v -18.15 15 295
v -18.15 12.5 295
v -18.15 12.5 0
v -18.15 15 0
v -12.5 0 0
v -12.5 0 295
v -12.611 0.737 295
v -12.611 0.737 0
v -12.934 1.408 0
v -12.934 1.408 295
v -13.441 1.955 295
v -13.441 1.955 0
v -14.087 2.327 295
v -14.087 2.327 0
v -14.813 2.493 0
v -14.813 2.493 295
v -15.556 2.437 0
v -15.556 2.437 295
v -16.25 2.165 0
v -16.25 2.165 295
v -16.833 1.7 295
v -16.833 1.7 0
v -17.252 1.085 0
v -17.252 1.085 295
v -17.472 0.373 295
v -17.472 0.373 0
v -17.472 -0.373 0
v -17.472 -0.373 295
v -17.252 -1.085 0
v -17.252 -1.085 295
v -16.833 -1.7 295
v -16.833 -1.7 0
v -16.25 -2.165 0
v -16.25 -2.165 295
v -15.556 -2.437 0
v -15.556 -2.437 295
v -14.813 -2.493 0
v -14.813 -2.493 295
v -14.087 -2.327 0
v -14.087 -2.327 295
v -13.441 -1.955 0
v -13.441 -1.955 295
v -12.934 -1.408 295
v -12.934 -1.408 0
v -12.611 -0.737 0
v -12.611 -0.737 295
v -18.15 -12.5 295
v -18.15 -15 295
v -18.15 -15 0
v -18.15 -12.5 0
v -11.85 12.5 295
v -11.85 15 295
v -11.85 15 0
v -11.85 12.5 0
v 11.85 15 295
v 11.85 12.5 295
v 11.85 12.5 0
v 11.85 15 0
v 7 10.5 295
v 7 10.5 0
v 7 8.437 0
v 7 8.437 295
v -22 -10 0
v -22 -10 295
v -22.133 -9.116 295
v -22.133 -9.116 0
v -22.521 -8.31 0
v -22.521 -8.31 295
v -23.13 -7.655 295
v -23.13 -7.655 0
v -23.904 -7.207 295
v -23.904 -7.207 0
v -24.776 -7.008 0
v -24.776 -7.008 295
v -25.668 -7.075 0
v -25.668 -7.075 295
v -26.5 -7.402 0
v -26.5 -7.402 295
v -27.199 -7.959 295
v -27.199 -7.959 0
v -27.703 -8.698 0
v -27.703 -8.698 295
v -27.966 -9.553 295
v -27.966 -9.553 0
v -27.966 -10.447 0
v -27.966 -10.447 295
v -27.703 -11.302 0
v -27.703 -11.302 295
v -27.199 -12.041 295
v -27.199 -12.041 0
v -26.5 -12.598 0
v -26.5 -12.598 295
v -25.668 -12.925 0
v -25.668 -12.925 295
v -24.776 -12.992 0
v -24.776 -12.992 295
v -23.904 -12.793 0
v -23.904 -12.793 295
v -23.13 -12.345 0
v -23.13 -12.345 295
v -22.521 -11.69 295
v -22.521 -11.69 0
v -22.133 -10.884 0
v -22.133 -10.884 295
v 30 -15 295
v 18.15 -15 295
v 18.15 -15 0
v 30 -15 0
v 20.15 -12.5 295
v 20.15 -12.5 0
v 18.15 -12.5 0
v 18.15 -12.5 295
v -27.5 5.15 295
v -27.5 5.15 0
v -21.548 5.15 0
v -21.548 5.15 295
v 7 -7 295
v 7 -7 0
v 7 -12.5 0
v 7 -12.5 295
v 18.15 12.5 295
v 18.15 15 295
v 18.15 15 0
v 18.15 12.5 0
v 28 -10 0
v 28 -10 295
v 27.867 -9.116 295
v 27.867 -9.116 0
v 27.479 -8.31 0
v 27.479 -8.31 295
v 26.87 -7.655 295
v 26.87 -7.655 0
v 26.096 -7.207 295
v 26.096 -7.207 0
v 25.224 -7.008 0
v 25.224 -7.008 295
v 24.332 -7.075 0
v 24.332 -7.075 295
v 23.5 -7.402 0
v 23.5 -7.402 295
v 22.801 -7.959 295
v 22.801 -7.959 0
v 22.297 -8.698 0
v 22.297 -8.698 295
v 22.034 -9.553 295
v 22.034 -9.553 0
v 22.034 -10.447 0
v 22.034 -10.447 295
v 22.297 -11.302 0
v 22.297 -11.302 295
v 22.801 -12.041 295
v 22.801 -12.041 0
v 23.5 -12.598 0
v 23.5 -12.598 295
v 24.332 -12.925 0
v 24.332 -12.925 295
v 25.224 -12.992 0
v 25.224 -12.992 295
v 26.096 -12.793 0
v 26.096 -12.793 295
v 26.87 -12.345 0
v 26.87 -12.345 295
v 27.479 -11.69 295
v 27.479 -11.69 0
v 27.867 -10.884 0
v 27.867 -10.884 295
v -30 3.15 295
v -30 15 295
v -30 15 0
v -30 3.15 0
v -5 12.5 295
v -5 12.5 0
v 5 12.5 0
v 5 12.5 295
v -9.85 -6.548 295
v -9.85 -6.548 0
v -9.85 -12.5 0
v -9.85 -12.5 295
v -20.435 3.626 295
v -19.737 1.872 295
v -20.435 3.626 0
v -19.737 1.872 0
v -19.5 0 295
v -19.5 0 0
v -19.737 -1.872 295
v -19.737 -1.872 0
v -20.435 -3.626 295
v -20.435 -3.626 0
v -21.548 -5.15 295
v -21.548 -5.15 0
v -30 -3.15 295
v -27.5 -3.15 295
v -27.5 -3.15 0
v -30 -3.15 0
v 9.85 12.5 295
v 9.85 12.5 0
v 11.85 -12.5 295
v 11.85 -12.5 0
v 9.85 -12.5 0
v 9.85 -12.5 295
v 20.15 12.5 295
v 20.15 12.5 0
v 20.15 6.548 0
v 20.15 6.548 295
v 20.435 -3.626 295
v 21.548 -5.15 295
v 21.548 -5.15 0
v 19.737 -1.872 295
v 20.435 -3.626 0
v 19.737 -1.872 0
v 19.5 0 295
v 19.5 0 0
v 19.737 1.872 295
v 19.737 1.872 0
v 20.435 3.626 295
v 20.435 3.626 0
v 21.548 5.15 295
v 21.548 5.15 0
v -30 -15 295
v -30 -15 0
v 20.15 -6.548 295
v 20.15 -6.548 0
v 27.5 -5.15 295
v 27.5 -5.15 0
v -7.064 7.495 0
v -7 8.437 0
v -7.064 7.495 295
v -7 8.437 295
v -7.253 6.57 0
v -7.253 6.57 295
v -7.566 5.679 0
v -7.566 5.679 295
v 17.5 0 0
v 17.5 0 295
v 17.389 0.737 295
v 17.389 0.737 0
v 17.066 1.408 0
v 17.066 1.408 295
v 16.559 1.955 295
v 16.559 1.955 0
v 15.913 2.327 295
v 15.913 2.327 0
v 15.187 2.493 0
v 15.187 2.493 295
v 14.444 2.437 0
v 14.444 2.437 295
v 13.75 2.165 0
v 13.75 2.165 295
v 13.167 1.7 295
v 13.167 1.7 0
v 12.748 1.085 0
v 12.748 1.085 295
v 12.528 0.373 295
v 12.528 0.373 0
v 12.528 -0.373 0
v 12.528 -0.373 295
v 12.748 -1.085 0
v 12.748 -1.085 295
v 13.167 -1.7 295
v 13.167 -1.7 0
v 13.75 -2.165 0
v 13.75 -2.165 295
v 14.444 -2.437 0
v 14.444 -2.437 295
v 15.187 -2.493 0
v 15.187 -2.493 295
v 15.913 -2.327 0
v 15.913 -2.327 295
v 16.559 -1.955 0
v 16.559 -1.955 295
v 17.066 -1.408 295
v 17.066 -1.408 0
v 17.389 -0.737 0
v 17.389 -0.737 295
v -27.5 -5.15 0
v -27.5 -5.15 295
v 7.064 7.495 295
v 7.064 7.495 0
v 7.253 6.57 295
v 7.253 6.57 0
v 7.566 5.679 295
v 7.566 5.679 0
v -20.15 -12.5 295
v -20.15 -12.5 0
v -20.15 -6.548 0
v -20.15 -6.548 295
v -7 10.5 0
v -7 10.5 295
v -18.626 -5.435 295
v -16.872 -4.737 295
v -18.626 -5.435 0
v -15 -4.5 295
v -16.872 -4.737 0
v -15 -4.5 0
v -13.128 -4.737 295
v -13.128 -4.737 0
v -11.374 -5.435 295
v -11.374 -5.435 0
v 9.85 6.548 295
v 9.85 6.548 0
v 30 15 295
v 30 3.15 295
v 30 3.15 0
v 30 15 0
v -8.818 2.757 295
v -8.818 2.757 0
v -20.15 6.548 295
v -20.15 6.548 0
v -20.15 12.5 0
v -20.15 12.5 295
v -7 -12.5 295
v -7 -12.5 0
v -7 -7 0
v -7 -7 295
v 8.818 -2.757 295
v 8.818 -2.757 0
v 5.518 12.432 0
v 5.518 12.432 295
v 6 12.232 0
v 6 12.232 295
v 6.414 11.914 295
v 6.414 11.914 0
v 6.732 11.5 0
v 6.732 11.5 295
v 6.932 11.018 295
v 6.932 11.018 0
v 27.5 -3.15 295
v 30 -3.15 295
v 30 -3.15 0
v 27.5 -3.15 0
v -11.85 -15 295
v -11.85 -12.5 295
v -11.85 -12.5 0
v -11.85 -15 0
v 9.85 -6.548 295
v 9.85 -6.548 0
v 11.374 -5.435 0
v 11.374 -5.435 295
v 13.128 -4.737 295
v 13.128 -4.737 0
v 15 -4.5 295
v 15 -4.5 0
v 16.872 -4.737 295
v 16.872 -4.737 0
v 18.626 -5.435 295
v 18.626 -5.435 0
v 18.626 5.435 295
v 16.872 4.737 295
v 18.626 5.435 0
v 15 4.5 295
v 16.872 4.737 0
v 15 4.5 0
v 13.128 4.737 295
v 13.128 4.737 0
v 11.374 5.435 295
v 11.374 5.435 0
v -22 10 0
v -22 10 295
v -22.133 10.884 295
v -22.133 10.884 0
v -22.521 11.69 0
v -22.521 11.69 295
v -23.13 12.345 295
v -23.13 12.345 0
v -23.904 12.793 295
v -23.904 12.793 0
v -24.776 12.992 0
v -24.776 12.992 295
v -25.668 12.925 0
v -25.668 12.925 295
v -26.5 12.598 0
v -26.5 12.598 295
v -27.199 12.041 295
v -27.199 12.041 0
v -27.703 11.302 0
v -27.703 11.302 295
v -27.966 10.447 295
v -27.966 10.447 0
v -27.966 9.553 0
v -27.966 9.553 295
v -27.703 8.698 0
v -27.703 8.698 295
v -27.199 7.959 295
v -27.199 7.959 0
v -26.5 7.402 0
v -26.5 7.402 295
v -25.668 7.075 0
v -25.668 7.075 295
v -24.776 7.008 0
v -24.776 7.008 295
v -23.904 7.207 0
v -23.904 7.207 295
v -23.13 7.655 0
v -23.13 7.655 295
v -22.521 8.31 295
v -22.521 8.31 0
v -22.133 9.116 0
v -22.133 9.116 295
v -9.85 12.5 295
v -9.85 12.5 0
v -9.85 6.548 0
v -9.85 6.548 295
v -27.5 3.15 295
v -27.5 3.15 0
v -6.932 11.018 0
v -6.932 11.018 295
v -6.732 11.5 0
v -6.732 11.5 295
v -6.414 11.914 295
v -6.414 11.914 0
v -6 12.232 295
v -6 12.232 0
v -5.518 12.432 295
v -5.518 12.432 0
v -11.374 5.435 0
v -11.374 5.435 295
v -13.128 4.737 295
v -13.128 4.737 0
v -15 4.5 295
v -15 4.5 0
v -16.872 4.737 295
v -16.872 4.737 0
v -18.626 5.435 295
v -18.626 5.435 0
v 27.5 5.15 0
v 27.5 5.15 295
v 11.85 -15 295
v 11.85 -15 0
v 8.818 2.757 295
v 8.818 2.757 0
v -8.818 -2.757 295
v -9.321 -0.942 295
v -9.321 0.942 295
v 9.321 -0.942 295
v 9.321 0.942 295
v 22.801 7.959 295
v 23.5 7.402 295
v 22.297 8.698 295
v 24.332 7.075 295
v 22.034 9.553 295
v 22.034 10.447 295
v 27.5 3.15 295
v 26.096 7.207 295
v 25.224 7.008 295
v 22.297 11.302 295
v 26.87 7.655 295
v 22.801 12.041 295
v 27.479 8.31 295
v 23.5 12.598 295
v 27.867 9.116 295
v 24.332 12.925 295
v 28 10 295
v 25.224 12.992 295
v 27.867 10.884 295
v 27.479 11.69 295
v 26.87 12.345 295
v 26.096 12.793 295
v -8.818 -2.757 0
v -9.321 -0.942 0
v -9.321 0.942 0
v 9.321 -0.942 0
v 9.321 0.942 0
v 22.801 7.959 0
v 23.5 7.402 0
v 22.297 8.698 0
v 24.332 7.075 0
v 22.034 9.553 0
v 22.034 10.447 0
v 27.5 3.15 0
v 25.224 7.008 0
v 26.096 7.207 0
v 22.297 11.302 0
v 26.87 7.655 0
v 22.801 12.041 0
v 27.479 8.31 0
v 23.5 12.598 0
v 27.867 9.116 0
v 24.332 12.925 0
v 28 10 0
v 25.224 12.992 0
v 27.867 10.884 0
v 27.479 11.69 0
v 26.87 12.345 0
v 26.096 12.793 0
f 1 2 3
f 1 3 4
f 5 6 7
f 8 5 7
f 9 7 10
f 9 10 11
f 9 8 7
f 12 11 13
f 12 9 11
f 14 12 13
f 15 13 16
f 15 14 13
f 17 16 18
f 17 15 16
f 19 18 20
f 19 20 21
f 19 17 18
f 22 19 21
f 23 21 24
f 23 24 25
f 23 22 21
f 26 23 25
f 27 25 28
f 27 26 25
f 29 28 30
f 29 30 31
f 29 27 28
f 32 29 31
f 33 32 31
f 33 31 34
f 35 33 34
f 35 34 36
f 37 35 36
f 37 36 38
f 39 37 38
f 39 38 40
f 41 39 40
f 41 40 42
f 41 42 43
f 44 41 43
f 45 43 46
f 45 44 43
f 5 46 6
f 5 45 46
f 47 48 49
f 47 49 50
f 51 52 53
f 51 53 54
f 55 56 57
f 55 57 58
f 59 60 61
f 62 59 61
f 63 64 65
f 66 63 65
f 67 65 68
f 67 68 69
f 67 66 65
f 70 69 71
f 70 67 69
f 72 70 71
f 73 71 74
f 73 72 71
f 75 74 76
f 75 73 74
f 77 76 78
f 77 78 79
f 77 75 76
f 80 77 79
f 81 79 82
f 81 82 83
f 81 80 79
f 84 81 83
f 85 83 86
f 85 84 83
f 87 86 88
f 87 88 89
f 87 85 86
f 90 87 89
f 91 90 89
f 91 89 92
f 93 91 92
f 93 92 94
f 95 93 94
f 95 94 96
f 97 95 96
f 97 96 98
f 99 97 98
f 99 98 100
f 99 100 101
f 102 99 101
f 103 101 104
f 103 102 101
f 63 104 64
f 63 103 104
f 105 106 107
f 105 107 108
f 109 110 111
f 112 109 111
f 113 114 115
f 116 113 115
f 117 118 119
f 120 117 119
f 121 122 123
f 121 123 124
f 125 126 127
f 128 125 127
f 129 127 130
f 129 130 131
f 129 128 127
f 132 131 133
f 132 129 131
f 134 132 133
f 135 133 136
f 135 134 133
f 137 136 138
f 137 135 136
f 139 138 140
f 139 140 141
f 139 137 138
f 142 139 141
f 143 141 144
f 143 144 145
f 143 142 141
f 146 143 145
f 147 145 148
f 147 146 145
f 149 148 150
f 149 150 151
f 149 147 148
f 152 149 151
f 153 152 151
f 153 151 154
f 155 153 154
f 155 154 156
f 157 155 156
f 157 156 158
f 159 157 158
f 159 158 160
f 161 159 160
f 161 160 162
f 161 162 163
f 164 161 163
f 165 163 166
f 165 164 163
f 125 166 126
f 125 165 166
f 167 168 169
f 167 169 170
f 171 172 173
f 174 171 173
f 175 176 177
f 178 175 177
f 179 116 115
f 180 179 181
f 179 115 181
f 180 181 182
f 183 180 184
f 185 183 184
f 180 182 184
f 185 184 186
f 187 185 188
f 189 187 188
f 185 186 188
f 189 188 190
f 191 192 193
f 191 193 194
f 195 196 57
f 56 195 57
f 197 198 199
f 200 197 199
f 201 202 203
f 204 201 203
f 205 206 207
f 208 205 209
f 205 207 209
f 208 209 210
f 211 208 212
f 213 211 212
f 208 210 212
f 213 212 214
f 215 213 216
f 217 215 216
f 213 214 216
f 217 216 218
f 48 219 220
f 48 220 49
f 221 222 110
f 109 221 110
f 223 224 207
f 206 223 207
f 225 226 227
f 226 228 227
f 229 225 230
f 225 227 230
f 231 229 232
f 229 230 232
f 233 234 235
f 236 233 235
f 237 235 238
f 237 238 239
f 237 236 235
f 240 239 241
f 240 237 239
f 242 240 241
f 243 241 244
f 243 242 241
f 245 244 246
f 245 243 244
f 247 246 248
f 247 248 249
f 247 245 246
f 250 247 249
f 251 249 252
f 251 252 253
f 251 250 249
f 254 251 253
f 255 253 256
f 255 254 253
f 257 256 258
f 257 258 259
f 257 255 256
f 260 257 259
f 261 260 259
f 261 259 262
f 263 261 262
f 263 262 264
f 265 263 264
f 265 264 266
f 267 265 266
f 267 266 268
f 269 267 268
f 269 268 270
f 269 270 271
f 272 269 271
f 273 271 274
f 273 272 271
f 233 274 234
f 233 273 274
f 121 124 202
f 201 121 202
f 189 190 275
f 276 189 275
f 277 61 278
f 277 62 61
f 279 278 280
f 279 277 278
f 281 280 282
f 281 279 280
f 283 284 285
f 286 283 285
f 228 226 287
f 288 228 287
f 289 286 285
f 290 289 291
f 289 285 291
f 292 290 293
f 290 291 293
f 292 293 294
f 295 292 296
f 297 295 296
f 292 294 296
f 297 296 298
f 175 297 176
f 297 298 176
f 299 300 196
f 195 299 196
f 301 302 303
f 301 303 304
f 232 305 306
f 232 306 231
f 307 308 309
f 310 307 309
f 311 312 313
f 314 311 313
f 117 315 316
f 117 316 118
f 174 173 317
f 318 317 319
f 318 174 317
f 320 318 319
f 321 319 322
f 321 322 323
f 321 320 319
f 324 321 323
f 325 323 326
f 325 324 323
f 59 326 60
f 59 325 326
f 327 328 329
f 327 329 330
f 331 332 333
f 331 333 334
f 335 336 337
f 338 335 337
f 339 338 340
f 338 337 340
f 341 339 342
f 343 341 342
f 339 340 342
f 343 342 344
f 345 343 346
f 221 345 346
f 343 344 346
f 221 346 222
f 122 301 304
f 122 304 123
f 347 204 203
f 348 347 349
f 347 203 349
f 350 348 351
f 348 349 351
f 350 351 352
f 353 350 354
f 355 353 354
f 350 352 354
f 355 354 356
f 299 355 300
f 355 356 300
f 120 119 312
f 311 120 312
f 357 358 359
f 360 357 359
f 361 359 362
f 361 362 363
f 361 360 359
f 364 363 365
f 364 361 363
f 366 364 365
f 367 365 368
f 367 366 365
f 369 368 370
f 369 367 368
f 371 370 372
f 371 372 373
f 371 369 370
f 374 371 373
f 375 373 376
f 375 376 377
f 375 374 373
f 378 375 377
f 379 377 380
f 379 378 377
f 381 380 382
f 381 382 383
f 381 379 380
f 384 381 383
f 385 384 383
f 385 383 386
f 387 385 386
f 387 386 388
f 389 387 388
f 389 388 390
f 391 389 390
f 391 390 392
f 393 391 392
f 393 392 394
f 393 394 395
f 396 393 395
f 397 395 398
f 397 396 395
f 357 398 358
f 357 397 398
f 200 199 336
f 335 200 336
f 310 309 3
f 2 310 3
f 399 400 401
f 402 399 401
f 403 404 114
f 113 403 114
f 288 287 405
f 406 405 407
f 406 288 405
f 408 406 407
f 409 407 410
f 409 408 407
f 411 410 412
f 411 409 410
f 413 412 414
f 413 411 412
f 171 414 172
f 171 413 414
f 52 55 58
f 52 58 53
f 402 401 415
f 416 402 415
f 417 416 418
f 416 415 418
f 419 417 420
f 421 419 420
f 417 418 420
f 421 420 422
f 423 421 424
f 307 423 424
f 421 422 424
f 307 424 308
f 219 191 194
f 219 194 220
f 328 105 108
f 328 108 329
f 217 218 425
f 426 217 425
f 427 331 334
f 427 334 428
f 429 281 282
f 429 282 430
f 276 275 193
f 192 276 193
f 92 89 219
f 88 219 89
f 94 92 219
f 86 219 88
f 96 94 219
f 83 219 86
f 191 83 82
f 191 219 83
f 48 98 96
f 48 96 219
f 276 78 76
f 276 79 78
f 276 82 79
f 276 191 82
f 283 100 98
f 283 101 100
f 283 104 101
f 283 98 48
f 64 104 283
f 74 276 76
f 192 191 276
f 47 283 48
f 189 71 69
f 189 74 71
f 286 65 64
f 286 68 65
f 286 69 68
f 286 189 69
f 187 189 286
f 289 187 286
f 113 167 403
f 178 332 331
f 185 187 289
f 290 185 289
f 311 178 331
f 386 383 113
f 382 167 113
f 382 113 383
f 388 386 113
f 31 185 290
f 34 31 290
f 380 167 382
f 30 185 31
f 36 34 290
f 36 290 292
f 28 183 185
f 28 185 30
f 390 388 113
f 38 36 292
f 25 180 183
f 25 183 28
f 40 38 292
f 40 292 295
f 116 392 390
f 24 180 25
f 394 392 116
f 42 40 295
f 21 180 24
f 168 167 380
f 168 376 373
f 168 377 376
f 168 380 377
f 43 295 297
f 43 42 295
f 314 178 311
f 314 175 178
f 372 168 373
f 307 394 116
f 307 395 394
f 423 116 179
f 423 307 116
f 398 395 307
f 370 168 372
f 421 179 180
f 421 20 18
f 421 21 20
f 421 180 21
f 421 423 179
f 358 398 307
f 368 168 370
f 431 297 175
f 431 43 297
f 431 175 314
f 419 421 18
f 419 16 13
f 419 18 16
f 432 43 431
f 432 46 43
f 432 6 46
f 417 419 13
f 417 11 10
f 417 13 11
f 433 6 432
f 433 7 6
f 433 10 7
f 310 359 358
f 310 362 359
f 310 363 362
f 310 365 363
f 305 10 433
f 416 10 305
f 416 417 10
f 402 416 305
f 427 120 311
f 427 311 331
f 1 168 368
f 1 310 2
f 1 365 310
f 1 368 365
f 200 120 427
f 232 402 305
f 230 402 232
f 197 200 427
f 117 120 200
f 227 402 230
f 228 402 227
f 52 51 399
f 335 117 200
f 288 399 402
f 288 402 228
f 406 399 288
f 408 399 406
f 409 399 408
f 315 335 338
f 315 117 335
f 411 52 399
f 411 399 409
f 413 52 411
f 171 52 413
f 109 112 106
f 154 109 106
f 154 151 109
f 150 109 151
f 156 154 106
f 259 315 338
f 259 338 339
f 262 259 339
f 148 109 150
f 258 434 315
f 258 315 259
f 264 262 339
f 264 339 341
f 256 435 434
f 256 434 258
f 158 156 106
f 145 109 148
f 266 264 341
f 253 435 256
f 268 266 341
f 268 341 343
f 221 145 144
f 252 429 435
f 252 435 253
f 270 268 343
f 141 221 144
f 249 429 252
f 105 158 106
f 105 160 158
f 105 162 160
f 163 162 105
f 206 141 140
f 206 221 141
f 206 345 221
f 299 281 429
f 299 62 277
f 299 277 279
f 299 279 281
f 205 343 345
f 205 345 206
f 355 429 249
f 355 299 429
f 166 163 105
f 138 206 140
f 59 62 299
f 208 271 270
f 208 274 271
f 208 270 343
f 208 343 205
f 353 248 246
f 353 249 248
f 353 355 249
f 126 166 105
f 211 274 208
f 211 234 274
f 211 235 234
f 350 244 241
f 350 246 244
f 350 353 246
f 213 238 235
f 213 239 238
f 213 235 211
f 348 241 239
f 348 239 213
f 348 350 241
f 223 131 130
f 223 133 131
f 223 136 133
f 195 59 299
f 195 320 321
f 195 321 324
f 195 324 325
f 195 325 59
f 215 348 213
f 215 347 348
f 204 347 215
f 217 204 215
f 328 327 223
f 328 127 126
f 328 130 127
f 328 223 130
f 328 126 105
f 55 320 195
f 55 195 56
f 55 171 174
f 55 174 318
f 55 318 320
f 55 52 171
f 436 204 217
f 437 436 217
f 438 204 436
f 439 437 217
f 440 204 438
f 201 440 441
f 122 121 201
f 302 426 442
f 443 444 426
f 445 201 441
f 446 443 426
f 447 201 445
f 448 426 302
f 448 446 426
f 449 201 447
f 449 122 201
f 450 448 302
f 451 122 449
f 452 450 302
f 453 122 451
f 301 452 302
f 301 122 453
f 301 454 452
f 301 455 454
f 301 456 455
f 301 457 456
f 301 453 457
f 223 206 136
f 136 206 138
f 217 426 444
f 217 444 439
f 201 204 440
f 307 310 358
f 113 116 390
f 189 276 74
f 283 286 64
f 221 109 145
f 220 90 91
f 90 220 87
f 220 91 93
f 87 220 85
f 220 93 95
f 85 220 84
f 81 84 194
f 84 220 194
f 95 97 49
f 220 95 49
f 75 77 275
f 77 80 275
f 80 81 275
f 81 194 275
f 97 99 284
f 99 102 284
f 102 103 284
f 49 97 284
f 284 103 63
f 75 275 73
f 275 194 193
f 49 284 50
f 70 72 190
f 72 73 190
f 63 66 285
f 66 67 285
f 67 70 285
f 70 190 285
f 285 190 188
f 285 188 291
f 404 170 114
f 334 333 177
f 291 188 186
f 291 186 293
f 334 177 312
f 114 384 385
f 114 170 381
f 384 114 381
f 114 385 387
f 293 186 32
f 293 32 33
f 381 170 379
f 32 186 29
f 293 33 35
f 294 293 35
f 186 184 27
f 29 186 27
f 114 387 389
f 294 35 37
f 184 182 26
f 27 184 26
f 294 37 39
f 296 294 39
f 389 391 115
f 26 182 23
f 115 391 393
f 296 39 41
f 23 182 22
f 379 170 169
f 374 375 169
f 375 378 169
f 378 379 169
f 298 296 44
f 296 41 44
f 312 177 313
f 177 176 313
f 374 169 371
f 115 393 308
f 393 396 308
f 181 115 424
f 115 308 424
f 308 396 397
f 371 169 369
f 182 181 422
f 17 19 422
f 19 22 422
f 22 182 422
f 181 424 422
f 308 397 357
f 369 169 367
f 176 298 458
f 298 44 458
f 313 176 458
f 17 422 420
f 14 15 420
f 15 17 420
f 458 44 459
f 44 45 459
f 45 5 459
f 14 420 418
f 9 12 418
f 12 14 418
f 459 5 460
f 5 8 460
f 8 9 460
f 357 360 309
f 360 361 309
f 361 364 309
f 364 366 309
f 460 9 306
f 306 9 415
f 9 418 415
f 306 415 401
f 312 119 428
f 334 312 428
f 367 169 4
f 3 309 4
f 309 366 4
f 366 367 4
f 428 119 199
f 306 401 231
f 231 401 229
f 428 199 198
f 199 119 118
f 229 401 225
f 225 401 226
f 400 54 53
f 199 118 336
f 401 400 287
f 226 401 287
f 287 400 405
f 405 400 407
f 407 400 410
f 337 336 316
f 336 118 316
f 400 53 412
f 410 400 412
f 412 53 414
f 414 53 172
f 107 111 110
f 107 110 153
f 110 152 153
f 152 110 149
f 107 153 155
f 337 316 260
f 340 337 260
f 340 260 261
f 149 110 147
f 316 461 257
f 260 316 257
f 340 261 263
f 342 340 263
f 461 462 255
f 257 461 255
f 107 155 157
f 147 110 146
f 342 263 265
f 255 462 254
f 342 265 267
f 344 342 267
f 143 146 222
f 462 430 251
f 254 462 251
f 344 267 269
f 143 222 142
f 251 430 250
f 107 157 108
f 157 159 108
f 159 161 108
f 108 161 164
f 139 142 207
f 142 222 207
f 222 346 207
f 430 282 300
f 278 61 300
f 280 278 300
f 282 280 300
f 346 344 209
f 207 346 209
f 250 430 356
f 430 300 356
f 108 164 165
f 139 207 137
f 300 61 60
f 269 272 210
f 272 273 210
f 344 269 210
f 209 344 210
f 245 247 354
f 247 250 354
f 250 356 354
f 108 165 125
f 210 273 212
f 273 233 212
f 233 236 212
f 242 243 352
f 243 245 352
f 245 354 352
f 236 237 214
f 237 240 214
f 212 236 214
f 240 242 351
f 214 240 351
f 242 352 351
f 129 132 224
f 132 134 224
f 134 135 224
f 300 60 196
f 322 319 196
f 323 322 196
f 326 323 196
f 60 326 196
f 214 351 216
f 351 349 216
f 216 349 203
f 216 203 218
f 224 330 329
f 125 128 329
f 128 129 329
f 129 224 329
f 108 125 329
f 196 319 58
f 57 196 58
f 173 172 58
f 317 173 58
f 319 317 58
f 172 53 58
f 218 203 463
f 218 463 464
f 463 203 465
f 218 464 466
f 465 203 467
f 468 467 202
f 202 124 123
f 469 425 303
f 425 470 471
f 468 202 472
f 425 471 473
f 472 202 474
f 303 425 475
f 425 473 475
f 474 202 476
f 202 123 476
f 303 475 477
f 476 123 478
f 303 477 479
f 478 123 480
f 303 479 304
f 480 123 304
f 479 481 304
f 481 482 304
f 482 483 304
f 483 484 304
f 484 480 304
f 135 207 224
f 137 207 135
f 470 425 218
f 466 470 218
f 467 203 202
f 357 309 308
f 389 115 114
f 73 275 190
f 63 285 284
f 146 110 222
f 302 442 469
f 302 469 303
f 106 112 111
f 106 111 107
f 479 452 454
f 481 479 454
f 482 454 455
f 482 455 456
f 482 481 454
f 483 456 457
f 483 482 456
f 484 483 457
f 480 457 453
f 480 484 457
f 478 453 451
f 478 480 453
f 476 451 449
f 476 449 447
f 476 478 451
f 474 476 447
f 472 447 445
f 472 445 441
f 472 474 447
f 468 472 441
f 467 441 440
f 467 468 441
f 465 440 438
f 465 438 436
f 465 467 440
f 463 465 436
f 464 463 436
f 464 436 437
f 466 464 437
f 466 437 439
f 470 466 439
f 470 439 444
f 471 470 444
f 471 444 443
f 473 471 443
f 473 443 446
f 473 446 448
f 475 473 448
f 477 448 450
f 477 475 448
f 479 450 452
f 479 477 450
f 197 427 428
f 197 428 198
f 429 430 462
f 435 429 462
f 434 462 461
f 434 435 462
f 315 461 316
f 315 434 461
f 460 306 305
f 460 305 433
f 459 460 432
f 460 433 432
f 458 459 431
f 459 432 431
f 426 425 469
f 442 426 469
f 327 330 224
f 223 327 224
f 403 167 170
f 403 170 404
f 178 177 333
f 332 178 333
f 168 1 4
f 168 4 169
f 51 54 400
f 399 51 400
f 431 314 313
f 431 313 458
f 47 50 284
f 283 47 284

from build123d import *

# Parameters (mm, degrees)
F0_R     = 3
F0_R_2   = 2.5
F1_DEPTH = 295
F2_R     = 2
F3_R     = 7


# Not quite as in the source:
# - a feature names something its author has since deleted; it is built from what else it names


with BuildPart() as f1:
    # F0 (on Top) → F1 (new body)
    with BuildSketch(Plane.XY):
        with BuildLine():
            Line((18.15, -15), (30, -15))
            Line((30, -15), (30, -3.15))
            Line((30, -3.15), (27.5, -3.15))
            Line((27.5, -3.15), (27.5, -5.15))
            Line((27.5, -5.15), (21.5477069044, -5.15))
            ThreePointArc((21.5477069044, -5.15), (19.5, 0), (21.5477069044, 5.15))
            Line((21.5477069044, 5.15), (27.5, 5.15))
            Line((27.5, 5.15), (27.5, 3.15))
            Line((27.5, 3.15), (30, 3.15))
            Line((30, 3.15), (30, 15))
            Line((30, 15), (18.15, 15))
            Line((18.15, 15), (18.15, 12.5))
            Line((18.15, 12.5), (20.15, 12.5))
            Line((20.15, 12.5), (20.15, 6.5477069044))
            ThreePointArc((20.15, 6.5477069044), (15, 4.5), (9.85, 6.5477069044))
            Line((9.85, 6.5477069044), (9.85, 12.5))
            Line((9.85, 12.5), (11.85, 12.5))
            Line((11.85, 12.5), (11.85, 15))
            Line((11.85, 15), (-11.85, 15))
            Line((-11.85, 15), (-11.85, 12.5))
            Line((-11.85, 12.5), (-9.85, 12.5))
            Line((-9.85, 12.5), (-9.85, 6.5477069044))
            ThreePointArc((-9.85, 6.5477069044), (-15, 4.5), (-20.15, 6.5477069044))
            Line((-20.15, 6.5477069044), (-20.15, 12.5))
            Line((-20.15, 12.5), (-18.15, 12.5))
            Line((-18.15, 12.5), (-18.15, 15))
            Line((-18.15, 15), (-30, 15))
            Line((-30, 15), (-30, 3.15))
            Line((-30, 3.15), (-27.5, 3.15))
            Line((-27.5, 3.15), (-27.5, 5.15))
            Line((-27.5, 5.15), (-21.5477069044, 5.15))
            ThreePointArc((-21.5477069044, 5.15), (-19.5, 0), (-21.5477069044, -5.15))
            Line((-21.5477069044, -5.15), (-27.5, -5.15))
            Line((-27.5, -5.15), (-27.5, -3.15))
            Line((-27.5, -3.15), (-30, -3.15))
            Line((-30, -3.15), (-30, -15))
            Line((-30, -15), (-18.15, -15))
            Line((-18.15, -15), (-18.15, -12.5))
            Line((-18.15, -12.5), (-20.15, -12.5))
            Line((-20.15, -12.5), (-20.15, -6.5477069044))
            ThreePointArc((-20.15, -6.5477069044), (-15, -4.5), (-9.85, -6.5477069044))
            Line((-9.85, -6.5477069044), (-9.85, -12.5))
            Line((-9.85, -12.5), (-11.85, -12.5))
            Line((-11.85, -12.5), (-11.85, -15))
            Line((-11.85, -15), (11.85, -15))
            Line((11.85, -15), (11.85, -12.5))
            Line((11.85, -12.5), (9.85, -12.5))
            Line((9.85, -12.5), (9.85, -6.5477069044))
            ThreePointArc((9.85, -6.5477069044), (15, -4.5), (20.15, -6.5477069044))
            Line((20.15, -6.5477069044), (20.15, -12.5))
            Line((20.15, -12.5), (18.15, -12.5))
            Line((18.15, -12.5), (18.15, -15))
        make_face()
        with Locations((-25, -10)):
            Circle(F0_R, mode=Mode.SUBTRACT)
        with Locations((25, -10)):
            Circle(F0_R, mode=Mode.SUBTRACT)
        with Locations((-15, 0)):
            Circle(F0_R_2, mode=Mode.SUBTRACT)
        with Locations((-25, 10)):
            Circle(F0_R, mode=Mode.SUBTRACT)
        Polygon((-7, 7), (-7, 12.5), (0, 12.5), (7, 12.5), (7, 7), (10, 0), (7, -7), (7, -12.5), (0, -12.5), (-7, -12.5), (-7, -7), (-10, 0), align=None, mode=Mode.SUBTRACT)
        with Locations((15, 0)):
            Circle(F0_R_2, mode=Mode.SUBTRACT)
        with Locations((25, 10)):
            Circle(F0_R, mode=Mode.SUBTRACT)
    extrude(amount=F1_DEPTH)

    # F2
    f2_edges = [f1.edges().sort_by_distance(p)[0] for p in [
        (-7, 12.5, 147.5),
        (7, 12.5, 147.5),
    ]]
    fillet(f2_edges, radius=F2_R)

    # F3
    f3_edges = [f1.edges().sort_by_distance(p)[0] for p in [
        (-7, 7, 147.5),
        (-10, 0, 147.5),
        (7, 7, 147.5),
        (10, 0, 147.5),
    ]]
    fillet(f3_edges, radius=F3_R)


solid = f1.part
